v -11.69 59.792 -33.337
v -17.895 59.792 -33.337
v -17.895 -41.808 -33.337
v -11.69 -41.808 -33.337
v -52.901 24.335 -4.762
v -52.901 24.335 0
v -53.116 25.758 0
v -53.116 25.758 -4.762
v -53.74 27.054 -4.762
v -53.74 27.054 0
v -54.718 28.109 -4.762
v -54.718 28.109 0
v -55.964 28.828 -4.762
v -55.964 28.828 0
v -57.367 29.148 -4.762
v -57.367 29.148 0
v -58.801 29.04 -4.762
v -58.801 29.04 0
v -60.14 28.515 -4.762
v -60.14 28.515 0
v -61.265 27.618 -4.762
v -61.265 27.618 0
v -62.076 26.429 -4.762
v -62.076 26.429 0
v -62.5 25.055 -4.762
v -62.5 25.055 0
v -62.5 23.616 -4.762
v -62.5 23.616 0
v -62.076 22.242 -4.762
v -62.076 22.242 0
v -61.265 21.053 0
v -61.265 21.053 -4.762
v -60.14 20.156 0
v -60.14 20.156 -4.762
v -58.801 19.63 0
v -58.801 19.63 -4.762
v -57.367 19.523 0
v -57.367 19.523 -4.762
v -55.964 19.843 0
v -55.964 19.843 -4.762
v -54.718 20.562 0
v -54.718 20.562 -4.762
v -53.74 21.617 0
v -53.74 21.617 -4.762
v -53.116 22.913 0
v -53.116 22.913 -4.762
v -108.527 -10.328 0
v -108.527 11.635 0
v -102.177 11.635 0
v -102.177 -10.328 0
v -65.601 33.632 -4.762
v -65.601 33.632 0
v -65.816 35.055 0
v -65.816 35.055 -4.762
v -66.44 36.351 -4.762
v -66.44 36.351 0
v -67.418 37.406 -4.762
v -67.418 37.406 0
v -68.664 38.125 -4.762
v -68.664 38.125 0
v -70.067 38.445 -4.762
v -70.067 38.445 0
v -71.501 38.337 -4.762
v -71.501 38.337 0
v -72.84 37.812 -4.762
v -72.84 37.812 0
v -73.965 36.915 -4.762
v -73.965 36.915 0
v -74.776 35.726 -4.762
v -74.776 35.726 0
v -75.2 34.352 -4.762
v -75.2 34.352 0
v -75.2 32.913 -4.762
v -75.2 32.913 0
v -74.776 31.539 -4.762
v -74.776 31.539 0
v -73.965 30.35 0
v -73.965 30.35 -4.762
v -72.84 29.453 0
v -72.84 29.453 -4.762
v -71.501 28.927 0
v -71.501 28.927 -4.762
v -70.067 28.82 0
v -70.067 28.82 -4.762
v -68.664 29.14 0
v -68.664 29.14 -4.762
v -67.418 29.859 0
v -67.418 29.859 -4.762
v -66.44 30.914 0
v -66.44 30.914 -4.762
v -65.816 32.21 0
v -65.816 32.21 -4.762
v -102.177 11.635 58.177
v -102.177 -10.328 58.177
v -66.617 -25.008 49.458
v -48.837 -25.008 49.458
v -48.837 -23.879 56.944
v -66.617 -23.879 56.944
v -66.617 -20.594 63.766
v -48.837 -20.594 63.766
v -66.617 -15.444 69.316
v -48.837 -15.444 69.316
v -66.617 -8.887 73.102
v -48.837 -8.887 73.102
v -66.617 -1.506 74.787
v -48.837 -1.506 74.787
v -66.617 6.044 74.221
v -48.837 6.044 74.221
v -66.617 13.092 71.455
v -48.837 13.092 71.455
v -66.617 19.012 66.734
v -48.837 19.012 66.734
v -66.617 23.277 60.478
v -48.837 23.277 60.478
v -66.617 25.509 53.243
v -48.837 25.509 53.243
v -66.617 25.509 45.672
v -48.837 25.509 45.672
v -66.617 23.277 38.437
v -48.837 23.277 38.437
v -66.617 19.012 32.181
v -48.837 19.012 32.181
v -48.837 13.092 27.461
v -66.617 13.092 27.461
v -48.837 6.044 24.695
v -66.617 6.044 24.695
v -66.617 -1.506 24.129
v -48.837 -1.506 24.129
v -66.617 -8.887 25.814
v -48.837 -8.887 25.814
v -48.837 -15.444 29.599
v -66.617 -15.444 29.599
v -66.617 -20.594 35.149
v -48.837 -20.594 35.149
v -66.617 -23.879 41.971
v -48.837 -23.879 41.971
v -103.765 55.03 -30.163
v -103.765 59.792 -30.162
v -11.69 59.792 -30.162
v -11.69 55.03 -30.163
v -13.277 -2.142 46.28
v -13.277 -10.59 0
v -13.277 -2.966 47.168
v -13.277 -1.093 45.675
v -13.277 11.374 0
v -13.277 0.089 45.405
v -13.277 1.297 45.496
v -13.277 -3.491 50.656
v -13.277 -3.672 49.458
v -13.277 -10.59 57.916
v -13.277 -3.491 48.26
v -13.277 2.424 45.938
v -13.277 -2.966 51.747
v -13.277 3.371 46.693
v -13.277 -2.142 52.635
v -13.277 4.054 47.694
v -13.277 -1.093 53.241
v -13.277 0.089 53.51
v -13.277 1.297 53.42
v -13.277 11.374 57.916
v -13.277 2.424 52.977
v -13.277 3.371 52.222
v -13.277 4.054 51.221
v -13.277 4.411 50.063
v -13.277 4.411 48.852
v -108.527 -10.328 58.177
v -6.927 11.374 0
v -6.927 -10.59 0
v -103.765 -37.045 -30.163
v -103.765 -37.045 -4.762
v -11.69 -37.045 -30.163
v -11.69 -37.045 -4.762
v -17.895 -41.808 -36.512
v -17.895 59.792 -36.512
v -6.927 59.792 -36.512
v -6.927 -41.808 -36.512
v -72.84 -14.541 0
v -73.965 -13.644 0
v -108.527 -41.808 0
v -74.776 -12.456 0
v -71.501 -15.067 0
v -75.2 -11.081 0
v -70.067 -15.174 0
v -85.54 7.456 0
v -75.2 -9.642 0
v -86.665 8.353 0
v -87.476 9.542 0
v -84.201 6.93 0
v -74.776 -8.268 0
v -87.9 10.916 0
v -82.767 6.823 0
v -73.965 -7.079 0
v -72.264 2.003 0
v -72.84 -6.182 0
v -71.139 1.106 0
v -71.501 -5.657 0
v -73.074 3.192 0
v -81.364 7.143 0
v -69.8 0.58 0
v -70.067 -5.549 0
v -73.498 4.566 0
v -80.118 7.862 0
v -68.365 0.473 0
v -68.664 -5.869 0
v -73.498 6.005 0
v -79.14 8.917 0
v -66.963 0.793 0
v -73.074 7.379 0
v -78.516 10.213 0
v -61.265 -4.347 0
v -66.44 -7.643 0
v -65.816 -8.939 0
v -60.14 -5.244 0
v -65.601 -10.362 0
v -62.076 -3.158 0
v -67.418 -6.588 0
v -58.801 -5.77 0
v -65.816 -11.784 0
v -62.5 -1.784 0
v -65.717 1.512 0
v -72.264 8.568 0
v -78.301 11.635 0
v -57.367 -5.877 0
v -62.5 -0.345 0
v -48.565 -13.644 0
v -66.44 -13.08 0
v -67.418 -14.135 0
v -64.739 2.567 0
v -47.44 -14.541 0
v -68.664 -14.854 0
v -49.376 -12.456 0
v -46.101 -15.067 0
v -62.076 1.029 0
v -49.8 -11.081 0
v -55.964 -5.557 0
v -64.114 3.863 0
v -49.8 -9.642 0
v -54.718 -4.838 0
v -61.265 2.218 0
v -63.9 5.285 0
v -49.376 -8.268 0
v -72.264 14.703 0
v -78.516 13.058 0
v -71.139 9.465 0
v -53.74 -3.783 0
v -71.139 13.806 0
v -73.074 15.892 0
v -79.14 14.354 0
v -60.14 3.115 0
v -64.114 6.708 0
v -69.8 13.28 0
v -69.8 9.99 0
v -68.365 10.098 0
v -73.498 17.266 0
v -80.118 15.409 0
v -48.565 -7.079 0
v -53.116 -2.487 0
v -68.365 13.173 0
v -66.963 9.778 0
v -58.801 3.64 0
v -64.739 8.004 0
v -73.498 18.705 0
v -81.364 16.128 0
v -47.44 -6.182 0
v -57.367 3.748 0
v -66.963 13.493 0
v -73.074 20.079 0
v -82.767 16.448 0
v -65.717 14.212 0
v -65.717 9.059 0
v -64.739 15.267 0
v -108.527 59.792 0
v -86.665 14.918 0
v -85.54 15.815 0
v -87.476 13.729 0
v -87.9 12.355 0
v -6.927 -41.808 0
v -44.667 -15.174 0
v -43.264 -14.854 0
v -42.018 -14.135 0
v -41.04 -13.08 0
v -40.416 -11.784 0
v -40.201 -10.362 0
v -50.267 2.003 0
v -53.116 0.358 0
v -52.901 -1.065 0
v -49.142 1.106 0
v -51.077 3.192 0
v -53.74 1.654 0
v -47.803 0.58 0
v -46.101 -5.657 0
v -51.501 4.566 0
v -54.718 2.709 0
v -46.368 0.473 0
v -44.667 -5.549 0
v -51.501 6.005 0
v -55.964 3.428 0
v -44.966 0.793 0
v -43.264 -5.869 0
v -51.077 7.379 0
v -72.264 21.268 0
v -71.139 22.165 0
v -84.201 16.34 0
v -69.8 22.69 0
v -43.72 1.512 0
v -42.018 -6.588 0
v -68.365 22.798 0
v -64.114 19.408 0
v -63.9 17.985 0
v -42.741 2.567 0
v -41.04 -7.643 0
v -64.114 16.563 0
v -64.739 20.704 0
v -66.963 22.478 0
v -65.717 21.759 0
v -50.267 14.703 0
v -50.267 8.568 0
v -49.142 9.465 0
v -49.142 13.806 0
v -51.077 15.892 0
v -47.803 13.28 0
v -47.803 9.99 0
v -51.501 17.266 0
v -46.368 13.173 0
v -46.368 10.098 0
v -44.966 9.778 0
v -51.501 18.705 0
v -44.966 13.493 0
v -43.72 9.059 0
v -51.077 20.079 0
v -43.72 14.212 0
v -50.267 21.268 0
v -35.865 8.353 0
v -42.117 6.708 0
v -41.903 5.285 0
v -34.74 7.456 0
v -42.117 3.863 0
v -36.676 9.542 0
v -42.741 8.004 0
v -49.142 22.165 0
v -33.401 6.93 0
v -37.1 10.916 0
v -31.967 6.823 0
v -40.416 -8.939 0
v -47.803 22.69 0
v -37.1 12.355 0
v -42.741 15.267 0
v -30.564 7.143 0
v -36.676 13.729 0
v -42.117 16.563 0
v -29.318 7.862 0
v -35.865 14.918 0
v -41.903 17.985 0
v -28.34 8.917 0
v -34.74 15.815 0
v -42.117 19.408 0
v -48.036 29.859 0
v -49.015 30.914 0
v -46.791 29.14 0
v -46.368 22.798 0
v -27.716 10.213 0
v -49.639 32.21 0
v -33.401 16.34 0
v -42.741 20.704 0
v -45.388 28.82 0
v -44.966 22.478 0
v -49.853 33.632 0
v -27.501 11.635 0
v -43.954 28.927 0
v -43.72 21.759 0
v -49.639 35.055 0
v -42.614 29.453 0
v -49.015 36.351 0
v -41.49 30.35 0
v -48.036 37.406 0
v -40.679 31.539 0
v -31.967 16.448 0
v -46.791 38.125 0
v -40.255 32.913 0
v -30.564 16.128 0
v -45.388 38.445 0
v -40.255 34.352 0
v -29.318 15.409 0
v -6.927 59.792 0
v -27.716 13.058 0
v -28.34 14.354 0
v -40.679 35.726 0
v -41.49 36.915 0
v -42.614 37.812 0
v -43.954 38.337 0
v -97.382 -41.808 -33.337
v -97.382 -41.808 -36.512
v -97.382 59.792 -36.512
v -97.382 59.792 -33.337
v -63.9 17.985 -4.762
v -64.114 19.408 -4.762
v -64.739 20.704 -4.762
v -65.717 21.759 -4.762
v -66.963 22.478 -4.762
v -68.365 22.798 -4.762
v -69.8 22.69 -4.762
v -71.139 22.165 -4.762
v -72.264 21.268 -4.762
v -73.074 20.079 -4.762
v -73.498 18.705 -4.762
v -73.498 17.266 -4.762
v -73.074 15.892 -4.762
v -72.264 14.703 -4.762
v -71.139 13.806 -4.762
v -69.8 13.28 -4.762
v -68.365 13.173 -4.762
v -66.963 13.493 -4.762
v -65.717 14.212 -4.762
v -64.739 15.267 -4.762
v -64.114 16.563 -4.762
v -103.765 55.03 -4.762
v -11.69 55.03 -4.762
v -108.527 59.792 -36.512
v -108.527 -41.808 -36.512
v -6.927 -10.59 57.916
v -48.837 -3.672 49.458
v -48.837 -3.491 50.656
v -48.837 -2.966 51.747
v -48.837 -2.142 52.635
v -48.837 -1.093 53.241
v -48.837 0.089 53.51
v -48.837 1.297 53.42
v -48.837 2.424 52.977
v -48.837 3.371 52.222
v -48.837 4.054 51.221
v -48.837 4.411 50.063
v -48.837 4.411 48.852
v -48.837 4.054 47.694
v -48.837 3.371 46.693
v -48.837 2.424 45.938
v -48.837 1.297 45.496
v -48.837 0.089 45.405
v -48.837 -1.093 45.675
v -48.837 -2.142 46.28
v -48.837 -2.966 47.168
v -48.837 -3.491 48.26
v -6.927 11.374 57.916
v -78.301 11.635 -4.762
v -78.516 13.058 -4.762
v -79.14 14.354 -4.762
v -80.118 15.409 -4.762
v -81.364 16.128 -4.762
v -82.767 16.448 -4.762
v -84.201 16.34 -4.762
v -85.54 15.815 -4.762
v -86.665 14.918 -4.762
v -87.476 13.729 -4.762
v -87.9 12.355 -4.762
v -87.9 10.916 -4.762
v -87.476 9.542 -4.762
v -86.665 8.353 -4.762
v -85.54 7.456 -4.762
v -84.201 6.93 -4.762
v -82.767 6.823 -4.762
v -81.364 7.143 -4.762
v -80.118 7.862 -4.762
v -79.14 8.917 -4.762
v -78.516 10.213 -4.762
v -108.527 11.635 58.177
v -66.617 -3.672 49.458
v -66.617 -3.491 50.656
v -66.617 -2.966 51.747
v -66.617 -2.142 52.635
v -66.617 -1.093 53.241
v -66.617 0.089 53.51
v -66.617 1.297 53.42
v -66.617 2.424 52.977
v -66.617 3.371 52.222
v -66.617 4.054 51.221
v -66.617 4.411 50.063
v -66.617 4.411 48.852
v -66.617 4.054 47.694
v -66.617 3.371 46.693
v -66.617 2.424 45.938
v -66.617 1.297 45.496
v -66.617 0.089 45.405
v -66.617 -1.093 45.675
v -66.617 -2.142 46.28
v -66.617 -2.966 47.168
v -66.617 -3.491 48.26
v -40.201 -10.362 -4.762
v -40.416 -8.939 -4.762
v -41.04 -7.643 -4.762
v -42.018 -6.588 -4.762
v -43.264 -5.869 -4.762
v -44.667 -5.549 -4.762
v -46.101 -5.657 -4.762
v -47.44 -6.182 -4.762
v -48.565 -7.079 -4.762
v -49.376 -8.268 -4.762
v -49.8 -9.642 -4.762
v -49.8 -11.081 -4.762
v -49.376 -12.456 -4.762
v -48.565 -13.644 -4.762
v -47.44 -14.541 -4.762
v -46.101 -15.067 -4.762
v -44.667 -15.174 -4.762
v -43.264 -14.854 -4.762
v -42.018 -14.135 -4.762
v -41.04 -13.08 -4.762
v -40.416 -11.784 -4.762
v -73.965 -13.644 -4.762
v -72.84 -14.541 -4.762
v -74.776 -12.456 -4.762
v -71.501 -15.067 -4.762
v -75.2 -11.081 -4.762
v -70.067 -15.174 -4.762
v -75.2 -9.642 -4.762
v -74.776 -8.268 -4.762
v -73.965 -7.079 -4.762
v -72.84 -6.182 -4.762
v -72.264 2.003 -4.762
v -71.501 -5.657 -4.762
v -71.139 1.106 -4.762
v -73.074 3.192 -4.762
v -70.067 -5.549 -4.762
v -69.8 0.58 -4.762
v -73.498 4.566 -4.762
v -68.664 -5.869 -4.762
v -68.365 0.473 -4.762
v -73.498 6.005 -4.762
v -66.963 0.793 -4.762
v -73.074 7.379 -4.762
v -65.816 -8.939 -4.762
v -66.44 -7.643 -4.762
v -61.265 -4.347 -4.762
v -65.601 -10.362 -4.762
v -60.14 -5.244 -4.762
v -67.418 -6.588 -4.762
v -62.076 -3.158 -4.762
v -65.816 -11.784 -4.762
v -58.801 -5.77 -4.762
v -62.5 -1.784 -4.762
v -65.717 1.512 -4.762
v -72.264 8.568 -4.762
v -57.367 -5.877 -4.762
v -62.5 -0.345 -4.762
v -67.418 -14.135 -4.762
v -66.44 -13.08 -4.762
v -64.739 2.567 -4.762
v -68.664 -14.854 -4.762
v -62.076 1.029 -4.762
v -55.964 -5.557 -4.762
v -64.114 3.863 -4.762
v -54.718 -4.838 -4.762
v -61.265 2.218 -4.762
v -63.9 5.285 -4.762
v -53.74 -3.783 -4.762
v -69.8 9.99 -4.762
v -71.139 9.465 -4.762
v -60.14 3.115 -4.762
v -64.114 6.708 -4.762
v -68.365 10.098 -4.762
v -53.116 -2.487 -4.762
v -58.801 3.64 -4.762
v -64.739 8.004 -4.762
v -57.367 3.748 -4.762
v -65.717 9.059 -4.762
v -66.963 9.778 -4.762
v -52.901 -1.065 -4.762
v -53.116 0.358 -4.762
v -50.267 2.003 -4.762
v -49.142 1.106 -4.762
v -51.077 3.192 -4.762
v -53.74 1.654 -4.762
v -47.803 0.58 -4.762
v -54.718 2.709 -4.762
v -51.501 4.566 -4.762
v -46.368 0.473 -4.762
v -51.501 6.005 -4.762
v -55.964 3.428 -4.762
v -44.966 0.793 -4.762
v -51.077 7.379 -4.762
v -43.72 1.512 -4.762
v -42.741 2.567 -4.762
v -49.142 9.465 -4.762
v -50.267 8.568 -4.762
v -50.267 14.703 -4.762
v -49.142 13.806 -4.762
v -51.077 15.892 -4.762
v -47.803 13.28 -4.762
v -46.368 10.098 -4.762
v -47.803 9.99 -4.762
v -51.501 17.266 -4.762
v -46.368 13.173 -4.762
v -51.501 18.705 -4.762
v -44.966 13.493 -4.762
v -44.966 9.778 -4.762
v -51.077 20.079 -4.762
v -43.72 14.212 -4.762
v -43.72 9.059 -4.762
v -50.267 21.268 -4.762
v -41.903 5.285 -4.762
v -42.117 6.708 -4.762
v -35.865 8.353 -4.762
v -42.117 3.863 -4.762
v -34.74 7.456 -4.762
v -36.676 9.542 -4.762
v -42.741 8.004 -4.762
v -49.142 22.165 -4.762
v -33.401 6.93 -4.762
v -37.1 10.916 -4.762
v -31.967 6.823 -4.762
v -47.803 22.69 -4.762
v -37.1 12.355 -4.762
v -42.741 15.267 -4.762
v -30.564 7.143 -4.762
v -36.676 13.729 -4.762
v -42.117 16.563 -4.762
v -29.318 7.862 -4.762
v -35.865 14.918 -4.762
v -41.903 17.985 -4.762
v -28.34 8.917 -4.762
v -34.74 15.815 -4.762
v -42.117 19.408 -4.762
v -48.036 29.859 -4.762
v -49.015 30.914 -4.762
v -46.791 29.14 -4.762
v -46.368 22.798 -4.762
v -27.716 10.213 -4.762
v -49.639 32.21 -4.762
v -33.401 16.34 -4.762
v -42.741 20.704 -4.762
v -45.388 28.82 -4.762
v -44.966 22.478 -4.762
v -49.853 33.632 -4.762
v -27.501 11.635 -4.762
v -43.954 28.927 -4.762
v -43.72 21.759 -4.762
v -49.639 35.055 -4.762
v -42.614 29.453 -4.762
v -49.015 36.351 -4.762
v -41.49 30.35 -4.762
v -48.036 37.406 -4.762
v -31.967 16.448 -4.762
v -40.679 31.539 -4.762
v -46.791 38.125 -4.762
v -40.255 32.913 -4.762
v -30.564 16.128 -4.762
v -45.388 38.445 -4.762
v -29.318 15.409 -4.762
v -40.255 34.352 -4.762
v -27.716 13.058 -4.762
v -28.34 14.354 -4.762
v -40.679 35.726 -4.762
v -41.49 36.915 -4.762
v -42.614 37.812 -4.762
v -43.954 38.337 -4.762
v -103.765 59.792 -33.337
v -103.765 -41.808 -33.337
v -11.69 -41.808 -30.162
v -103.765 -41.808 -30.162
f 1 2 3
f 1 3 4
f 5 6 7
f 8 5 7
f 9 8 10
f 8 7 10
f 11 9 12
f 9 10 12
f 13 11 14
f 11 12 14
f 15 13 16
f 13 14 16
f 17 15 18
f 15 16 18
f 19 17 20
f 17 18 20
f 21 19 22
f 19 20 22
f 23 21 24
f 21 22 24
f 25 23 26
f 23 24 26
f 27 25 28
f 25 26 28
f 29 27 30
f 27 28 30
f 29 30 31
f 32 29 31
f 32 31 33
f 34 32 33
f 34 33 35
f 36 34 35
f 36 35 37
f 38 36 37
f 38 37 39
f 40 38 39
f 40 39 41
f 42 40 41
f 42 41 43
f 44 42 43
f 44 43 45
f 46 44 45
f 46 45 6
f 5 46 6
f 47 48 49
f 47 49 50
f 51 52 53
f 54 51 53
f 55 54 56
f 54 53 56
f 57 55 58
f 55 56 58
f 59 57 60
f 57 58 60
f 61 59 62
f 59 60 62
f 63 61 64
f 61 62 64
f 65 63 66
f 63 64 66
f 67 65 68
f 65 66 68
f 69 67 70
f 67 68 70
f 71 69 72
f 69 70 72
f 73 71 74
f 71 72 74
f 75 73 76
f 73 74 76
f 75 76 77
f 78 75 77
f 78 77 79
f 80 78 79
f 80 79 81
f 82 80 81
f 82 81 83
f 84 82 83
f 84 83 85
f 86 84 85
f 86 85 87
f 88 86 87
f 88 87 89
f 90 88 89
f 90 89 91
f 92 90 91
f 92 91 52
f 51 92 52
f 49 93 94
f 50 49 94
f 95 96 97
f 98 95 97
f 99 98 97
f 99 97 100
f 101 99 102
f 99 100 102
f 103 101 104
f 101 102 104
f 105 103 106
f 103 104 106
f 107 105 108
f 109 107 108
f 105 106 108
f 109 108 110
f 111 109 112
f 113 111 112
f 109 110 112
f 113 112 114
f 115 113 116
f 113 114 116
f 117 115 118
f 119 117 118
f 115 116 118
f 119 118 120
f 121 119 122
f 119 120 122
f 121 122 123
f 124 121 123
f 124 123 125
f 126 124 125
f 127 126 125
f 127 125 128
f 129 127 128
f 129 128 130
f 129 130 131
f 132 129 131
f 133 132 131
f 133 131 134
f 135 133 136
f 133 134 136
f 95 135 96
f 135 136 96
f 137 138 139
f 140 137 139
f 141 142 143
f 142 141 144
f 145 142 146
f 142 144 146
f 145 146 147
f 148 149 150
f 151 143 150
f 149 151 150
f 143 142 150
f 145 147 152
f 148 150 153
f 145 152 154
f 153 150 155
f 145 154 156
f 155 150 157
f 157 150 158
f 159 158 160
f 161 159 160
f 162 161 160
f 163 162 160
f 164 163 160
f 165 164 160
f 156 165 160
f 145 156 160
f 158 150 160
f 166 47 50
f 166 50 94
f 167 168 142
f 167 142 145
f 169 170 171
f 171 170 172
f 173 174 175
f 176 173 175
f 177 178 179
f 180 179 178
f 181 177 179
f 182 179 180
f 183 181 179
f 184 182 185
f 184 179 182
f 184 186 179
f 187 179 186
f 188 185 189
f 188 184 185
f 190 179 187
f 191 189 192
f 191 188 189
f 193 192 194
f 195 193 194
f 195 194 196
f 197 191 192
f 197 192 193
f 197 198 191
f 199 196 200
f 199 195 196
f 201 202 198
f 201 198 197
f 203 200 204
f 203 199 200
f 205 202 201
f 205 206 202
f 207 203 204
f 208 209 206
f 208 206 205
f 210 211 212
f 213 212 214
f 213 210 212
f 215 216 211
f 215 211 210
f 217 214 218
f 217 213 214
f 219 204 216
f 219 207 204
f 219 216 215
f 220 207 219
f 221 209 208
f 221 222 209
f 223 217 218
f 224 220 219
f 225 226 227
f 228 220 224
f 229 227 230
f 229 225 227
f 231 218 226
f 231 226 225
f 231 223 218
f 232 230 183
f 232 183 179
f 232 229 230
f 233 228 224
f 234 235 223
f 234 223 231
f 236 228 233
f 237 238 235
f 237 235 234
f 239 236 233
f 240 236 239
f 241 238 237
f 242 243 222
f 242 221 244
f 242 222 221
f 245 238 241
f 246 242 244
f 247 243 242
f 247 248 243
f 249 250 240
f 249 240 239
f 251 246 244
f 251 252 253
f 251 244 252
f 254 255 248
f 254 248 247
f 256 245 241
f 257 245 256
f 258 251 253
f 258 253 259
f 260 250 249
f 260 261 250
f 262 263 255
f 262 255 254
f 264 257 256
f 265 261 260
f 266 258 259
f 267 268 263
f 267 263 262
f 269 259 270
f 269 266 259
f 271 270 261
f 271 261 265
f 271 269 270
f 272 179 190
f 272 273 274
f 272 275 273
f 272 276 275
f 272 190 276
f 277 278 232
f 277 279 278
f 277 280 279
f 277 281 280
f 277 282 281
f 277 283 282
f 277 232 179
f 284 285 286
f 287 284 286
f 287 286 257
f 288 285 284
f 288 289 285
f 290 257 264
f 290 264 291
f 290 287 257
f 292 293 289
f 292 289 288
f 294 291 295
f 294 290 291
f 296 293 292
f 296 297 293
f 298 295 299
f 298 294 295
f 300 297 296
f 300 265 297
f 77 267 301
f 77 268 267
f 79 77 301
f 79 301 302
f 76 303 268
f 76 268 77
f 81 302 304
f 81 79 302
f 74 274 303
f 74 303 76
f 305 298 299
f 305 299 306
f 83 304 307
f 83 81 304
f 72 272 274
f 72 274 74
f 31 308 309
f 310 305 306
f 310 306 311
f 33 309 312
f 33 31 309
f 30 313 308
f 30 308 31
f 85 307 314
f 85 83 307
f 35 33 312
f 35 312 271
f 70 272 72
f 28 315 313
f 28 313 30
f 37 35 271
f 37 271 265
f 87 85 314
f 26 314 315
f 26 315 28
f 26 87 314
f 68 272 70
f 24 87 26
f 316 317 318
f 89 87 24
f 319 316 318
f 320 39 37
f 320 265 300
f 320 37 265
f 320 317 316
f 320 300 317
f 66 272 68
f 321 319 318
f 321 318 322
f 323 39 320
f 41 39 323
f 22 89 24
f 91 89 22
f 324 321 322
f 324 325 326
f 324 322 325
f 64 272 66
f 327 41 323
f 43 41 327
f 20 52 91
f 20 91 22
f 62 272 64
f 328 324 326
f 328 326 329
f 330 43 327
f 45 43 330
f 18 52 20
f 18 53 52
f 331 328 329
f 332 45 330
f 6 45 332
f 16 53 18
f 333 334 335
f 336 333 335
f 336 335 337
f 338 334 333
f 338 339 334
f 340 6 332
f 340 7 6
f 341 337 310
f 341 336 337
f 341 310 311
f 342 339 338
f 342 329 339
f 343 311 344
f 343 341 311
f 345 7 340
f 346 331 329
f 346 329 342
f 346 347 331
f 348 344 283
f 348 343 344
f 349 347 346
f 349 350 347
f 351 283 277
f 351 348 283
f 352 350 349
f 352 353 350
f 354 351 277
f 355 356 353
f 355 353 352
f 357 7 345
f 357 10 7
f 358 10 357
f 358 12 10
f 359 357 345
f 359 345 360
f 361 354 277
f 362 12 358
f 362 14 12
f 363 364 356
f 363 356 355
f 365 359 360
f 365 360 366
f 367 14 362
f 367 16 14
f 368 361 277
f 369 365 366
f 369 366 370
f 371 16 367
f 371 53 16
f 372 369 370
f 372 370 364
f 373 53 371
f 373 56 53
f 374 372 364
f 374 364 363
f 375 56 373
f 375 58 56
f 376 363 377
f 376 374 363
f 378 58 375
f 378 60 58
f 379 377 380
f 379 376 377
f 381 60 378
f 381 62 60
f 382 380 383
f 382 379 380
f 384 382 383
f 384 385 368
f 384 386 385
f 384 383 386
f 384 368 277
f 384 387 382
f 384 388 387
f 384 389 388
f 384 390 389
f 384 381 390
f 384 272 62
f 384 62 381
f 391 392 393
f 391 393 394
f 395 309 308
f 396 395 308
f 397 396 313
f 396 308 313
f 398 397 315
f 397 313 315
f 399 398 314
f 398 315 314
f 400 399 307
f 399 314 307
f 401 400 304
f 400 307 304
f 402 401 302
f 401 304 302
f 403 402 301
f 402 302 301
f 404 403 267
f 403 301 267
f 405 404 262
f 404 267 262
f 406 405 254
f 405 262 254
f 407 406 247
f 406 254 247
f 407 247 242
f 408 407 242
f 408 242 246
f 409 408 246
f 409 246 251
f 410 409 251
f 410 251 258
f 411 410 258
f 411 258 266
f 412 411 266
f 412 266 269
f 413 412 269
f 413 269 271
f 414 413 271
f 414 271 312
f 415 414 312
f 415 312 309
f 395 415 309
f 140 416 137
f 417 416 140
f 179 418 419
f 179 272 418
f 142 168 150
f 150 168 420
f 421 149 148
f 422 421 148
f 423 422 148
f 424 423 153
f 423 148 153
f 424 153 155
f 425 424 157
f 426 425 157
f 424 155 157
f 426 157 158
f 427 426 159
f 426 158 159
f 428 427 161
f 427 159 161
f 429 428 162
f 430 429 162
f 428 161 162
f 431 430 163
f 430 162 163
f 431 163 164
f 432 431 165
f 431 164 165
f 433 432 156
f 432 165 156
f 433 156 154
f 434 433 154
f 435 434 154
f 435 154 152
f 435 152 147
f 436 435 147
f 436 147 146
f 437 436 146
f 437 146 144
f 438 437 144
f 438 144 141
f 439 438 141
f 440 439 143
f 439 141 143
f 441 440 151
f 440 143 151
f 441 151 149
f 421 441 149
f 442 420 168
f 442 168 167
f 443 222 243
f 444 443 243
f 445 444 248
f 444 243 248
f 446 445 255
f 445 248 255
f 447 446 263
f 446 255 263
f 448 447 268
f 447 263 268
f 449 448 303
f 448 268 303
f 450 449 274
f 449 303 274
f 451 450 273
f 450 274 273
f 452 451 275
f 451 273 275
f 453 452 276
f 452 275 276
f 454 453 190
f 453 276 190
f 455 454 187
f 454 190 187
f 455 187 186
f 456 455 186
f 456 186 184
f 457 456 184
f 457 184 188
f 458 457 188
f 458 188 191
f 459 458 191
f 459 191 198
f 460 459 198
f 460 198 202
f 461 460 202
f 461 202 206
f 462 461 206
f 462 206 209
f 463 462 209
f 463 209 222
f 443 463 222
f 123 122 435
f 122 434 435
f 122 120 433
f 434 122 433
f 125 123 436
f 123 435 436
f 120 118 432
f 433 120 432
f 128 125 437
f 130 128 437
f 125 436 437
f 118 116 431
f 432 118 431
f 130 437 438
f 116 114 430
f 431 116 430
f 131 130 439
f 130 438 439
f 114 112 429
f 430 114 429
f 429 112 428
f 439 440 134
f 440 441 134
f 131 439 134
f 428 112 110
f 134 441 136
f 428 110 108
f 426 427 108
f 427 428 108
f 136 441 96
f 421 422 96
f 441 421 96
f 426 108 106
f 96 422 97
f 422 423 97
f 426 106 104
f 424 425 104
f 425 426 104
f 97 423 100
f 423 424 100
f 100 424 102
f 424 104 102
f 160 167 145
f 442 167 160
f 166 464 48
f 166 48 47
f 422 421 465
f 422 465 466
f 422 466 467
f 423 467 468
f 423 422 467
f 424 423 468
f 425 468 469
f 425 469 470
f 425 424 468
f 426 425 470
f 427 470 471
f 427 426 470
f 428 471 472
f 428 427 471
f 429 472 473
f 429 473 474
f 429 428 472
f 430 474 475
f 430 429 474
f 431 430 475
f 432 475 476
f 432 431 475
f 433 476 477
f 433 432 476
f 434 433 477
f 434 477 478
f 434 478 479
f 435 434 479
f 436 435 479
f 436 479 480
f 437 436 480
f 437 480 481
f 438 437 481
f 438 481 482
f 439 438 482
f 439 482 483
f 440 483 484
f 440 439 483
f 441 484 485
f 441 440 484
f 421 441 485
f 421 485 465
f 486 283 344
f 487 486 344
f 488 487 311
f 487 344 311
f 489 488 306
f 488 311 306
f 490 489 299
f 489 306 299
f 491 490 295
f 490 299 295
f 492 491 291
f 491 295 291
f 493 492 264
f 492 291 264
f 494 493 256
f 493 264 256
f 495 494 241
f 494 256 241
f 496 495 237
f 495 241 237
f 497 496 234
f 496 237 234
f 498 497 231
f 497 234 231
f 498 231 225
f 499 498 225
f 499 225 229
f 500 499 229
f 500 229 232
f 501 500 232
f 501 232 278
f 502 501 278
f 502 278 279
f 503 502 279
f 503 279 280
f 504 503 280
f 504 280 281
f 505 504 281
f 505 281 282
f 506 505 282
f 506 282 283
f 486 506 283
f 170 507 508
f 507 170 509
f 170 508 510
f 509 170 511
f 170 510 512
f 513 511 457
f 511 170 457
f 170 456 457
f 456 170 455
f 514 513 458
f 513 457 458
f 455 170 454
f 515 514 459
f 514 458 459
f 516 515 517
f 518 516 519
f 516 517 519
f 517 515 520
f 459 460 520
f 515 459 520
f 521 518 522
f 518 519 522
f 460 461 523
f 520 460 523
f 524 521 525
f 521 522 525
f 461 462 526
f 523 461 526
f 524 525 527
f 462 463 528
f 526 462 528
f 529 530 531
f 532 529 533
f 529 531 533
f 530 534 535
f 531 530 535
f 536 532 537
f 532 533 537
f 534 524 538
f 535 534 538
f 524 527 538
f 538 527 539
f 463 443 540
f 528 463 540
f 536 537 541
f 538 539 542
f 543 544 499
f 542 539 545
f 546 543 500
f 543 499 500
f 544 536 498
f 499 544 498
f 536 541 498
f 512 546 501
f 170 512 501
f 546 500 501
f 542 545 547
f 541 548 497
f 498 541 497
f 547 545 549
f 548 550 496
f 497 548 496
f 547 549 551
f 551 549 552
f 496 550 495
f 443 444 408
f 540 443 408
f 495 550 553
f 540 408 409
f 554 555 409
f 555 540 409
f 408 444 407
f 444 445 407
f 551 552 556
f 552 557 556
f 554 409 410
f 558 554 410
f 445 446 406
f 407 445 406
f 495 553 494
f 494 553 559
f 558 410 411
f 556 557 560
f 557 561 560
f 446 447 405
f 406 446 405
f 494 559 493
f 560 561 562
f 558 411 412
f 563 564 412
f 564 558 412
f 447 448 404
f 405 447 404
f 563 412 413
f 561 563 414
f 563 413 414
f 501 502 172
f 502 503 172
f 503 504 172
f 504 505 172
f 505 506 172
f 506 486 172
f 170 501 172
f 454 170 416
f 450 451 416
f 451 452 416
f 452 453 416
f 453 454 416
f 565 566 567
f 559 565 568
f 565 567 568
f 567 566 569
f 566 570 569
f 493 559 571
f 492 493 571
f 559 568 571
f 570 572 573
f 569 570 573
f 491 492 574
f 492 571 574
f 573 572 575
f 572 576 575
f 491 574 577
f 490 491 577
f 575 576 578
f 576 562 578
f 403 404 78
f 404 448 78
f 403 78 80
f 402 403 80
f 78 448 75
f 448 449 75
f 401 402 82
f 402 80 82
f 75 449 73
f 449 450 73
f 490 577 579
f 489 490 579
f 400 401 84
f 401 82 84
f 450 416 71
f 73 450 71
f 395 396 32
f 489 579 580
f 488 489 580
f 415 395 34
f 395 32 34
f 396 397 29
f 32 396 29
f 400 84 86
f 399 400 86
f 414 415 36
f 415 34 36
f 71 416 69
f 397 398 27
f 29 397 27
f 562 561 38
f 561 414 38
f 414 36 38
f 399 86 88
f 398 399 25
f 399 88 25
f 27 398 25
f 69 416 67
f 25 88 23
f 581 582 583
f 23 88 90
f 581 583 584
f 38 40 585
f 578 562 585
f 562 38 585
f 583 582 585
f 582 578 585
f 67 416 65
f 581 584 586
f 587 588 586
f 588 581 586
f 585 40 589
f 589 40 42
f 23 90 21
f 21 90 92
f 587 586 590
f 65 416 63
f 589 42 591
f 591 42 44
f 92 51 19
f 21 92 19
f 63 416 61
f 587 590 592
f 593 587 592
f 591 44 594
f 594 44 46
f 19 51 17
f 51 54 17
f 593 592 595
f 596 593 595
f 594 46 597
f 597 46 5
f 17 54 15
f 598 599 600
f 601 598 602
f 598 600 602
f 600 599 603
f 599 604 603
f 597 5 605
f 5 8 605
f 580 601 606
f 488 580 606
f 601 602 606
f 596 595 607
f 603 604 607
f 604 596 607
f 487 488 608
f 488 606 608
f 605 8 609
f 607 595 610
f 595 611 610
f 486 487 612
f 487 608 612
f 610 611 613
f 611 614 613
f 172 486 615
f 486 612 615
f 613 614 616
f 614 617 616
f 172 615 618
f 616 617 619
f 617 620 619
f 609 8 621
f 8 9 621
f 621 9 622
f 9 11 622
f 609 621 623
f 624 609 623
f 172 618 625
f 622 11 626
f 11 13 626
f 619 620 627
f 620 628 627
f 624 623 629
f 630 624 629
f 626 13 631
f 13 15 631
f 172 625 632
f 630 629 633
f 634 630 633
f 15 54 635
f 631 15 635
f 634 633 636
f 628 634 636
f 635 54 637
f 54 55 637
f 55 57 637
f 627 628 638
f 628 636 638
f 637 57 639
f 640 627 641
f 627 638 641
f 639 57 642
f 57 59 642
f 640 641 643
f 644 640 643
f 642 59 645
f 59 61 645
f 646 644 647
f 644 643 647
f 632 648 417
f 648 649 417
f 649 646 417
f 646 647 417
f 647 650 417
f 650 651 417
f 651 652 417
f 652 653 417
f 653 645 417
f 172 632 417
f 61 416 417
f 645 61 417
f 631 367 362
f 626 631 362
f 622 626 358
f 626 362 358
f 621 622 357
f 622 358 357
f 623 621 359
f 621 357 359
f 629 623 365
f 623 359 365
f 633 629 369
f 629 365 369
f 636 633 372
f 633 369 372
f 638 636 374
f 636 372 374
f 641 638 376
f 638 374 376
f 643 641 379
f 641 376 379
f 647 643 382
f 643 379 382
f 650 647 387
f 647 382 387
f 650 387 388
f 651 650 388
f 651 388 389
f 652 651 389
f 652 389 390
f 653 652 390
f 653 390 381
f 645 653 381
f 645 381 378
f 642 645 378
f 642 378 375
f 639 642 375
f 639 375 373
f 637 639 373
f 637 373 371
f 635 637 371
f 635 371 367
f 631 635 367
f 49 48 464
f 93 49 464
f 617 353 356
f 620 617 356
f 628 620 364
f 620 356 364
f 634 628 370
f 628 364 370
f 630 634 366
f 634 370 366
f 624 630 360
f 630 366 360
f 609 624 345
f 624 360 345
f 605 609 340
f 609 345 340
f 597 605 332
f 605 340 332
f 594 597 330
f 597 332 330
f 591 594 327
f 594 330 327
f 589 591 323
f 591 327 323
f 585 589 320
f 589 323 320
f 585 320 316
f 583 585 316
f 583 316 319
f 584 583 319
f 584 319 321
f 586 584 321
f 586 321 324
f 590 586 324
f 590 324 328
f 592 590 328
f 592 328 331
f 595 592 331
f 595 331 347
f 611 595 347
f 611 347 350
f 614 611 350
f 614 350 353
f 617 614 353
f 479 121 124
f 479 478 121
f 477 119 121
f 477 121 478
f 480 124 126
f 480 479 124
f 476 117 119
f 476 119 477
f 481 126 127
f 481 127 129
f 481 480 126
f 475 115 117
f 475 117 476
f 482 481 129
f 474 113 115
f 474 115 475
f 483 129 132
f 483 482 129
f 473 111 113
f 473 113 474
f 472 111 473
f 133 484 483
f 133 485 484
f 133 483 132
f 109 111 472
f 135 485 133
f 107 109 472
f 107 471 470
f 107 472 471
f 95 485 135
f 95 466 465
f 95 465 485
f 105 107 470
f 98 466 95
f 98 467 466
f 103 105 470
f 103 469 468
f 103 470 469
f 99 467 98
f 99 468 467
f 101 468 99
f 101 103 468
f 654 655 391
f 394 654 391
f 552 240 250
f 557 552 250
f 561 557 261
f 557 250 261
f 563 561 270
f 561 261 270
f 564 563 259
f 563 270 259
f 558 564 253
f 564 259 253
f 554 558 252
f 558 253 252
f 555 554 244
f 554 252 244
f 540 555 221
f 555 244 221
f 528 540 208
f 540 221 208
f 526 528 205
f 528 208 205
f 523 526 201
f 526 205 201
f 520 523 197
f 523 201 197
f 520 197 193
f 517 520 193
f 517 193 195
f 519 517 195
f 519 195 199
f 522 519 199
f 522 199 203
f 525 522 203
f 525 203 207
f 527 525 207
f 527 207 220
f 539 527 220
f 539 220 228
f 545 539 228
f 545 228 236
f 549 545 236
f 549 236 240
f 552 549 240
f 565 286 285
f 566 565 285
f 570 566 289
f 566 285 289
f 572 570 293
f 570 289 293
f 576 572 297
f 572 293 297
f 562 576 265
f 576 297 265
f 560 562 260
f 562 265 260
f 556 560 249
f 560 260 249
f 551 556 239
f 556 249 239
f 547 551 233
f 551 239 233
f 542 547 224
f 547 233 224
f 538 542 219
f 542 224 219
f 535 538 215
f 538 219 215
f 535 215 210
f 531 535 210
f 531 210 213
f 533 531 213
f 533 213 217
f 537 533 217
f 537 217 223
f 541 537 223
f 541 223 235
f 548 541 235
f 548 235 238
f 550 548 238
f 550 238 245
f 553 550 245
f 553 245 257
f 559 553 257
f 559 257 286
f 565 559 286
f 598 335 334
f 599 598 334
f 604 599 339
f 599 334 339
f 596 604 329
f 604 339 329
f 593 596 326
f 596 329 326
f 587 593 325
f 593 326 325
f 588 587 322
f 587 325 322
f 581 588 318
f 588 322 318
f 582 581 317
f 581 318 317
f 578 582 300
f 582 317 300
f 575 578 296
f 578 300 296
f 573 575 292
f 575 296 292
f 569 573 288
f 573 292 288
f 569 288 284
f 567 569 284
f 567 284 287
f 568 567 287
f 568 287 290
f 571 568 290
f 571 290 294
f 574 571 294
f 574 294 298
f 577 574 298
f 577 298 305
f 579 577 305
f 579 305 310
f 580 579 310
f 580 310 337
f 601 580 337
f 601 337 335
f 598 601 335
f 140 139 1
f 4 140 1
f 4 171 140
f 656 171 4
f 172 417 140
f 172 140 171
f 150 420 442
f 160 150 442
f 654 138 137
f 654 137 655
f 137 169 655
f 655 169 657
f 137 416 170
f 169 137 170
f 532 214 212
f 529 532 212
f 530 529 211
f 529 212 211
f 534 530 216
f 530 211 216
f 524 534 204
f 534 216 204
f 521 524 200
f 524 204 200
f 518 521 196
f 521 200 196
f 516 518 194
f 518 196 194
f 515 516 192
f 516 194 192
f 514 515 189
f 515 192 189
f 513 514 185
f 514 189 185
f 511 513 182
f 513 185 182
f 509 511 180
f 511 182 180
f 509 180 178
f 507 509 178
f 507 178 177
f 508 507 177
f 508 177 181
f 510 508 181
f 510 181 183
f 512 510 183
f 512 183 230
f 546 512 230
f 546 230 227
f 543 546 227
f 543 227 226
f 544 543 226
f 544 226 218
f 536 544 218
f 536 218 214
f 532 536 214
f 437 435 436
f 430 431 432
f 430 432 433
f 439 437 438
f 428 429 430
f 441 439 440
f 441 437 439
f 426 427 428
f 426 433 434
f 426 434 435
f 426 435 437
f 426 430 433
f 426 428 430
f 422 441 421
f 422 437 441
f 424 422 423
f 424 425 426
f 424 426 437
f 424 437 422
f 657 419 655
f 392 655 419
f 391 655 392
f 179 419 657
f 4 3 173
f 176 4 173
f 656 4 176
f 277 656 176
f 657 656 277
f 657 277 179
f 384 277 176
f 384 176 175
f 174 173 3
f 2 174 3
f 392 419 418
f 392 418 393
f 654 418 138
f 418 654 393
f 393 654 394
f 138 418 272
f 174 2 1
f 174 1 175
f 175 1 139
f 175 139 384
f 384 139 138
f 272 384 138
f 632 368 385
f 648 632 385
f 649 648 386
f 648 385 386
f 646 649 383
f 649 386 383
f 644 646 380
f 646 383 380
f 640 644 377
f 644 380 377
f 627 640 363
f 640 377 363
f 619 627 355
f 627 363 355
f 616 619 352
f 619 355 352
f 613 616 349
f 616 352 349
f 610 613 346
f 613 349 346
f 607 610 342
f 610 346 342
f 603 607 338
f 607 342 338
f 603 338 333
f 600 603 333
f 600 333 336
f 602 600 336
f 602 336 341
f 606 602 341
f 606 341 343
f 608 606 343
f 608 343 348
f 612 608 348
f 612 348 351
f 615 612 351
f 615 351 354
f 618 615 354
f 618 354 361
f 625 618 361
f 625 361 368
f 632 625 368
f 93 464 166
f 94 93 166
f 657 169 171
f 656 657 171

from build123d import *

# Parameters (mm, degrees)
F0_W      = 101.6
F0_H      = 101.6
F1_DEPTH  = 30.1625
F2_W      = 21.9635302201
F2_H      = 57.9157359898
F3_DEPTH  = 6.35
F4_W      = 21.9635302201
F4_H      = 58.17720294
F5_DEPTH  = 6.35
F7_T      = -4.7625
F6_R      = 4.826
F8_DEPTH  = 65.532
F9_W      = 4.7625
F9_H      = 101.6
F10_DEPTH = 6.35
F11_W     = 6.3828786112
F11_H     = 3.1750000536
F11_W_2   = 6.2050602607
F12_DEPTH = 101.6
F15_R     = 4.064
F16_DEPTH = 35.56
F17_R     = 25.4
F17_R_2   = 4.064
F18_DEPTH = 17.78


# Not quite as in the source:
# - the program builds the solid bodies; features that only make, move or delete a surface that nothing else refers to are left out


with BuildPart() as f1:
    # F0 (on Top) → F1 (new body)
    with BuildSketch(Plane.XY):
        with Locations((-57.7274323441, 8.9923822479)):
            Rectangle(F0_W, F0_H)
    extrude(amount=-F1_DEPTH)

    # F7
    f7_openings = [f1.faces().sort_by_distance(p)[0] for p in [
        (-57.727432, 8.992382, -30.1625),
    ]]
    offset(amount=F7_T, openings=f7_openings)

    # F6 (on face) → F8 (cut)
    with BuildSketch(Plane.XY):
        with Locations((-70.4274323441, 33.6324865892)):
            Circle(F6_R)
        with BuildLine():
            ThreePointArc((-40.2014323441, 33.6324865892), (-45.0274323441, 38.4584865892), (-49.8534323441, 33.6324865892))
            ThreePointArc((-49.8534323441, 33.6324865892), (-45.0274323441, 28.8064865892), (-40.2014323441, 33.6324865892))
        make_face()
        with Locations((-57.7274323441, 24.3354413331)):
            Circle(F6_R)
        with Locations((-46.728909716, 17.9854413331)):
            Circle(F6_R)
        with Locations((-46.728909716, 5.2854413331)):
            Circle(F6_R)
        with Locations((-32.3274323441, 11.6354413331)):
            Circle(F6_R)
        with Locations((-45.0274323441, -10.3616039231)):
            Circle(F6_R)
        with Locations((-57.7274323441, -1.0645586669)):
            Circle(F6_R)
        with Locations((-70.4274323441, -10.3616039231)):
            Circle(F6_R)
        with Locations((-68.7259549722, 5.2854413331)):
            Circle(F6_R)
        with Locations((-68.7259549722, 17.9854413331)):
            Circle(F6_R)
        with Locations((-83.1274323441, 11.6354413331)):
            Circle(F6_R)
    extrude(amount=-F8_DEPTH, mode=Mode.SUBTRACT)

    # F9 (on face) → F10 (join)
    with BuildSketch(Plane(origin=(0, 0, -30.1625), x_dir=(1, 0, 0), z_dir=(0, 0, -1))):
        with Locations((-106.1461823441, -8.9923822479)):
            Rectangle(F9_W, F9_H)
        with Locations((-9.3086823441, -8.9923822479)):
            Rectangle(F9_W, F9_H)
    extrude(amount=F10_DEPTH)

    # F11 (on face) → F12 (join)
    with BuildSketch(Plane.XZ.offset(41.8076177521)):
        with Locations((-100.5734930385, -34.9249999732)):
            Rectangle(F11_W, F11_H)
        with Locations((-14.7924624745, -34.9249999732)):
            Rectangle(F11_W_2, F11_H)
    extrude(amount=-F12_DEPTH)


with BuildPart() as f3:
    # F2 (on face) → F3 (new body)
    with BuildSketch(Plane.YZ.offset(-6.9274323441)):
        with Locations((0.3922064789, 28.9578679949)):
            Rectangle(F2_W, F2_H)
    extrude(amount=-F3_DEPTH)

    # F15 (on face) → F16 (join)
    with BuildSketch(Plane(origin=(-13.2774323441, 0, 0), x_dir=(0, -1, 0), z_dir=(-1, 0, 0))):
        with Locations((-0.3922064789, 49.4577102363)):
            Circle(F15_R)
    extrude(amount=F16_DEPTH)


with BuildPart() as f5:
    # F4 (on face) → F5 (new body)
    with BuildSketch(Plane(origin=(-108.5274323441, 0, 0), x_dir=(0, -1, 0), z_dir=(-1, 0, 0))):
        with Locations((-0.653676223, 29.08860147)):
            Rectangle(F4_W, F4_H)
    extrude(amount=-F5_DEPTH)


with BuildPart() as f18:
    # F17 (on face) → F18 (new body)
    with BuildSketch(Plane(origin=(-48.8374323441, 0, 0), x_dir=(0, -1, 0), z_dir=(-1, 0, 0))):
        with Locations((-0.3922064789, 49.4577102363)):
            Circle(F17_R)
        with Locations((-0.3922064789, 49.4577102363)):
            Circle(F17_R_2, mode=Mode.SUBTRACT)
    extrude(amount=F18_DEPTH)


solid = Compound([f1.part, f3.part, f5.part, f18.part])
